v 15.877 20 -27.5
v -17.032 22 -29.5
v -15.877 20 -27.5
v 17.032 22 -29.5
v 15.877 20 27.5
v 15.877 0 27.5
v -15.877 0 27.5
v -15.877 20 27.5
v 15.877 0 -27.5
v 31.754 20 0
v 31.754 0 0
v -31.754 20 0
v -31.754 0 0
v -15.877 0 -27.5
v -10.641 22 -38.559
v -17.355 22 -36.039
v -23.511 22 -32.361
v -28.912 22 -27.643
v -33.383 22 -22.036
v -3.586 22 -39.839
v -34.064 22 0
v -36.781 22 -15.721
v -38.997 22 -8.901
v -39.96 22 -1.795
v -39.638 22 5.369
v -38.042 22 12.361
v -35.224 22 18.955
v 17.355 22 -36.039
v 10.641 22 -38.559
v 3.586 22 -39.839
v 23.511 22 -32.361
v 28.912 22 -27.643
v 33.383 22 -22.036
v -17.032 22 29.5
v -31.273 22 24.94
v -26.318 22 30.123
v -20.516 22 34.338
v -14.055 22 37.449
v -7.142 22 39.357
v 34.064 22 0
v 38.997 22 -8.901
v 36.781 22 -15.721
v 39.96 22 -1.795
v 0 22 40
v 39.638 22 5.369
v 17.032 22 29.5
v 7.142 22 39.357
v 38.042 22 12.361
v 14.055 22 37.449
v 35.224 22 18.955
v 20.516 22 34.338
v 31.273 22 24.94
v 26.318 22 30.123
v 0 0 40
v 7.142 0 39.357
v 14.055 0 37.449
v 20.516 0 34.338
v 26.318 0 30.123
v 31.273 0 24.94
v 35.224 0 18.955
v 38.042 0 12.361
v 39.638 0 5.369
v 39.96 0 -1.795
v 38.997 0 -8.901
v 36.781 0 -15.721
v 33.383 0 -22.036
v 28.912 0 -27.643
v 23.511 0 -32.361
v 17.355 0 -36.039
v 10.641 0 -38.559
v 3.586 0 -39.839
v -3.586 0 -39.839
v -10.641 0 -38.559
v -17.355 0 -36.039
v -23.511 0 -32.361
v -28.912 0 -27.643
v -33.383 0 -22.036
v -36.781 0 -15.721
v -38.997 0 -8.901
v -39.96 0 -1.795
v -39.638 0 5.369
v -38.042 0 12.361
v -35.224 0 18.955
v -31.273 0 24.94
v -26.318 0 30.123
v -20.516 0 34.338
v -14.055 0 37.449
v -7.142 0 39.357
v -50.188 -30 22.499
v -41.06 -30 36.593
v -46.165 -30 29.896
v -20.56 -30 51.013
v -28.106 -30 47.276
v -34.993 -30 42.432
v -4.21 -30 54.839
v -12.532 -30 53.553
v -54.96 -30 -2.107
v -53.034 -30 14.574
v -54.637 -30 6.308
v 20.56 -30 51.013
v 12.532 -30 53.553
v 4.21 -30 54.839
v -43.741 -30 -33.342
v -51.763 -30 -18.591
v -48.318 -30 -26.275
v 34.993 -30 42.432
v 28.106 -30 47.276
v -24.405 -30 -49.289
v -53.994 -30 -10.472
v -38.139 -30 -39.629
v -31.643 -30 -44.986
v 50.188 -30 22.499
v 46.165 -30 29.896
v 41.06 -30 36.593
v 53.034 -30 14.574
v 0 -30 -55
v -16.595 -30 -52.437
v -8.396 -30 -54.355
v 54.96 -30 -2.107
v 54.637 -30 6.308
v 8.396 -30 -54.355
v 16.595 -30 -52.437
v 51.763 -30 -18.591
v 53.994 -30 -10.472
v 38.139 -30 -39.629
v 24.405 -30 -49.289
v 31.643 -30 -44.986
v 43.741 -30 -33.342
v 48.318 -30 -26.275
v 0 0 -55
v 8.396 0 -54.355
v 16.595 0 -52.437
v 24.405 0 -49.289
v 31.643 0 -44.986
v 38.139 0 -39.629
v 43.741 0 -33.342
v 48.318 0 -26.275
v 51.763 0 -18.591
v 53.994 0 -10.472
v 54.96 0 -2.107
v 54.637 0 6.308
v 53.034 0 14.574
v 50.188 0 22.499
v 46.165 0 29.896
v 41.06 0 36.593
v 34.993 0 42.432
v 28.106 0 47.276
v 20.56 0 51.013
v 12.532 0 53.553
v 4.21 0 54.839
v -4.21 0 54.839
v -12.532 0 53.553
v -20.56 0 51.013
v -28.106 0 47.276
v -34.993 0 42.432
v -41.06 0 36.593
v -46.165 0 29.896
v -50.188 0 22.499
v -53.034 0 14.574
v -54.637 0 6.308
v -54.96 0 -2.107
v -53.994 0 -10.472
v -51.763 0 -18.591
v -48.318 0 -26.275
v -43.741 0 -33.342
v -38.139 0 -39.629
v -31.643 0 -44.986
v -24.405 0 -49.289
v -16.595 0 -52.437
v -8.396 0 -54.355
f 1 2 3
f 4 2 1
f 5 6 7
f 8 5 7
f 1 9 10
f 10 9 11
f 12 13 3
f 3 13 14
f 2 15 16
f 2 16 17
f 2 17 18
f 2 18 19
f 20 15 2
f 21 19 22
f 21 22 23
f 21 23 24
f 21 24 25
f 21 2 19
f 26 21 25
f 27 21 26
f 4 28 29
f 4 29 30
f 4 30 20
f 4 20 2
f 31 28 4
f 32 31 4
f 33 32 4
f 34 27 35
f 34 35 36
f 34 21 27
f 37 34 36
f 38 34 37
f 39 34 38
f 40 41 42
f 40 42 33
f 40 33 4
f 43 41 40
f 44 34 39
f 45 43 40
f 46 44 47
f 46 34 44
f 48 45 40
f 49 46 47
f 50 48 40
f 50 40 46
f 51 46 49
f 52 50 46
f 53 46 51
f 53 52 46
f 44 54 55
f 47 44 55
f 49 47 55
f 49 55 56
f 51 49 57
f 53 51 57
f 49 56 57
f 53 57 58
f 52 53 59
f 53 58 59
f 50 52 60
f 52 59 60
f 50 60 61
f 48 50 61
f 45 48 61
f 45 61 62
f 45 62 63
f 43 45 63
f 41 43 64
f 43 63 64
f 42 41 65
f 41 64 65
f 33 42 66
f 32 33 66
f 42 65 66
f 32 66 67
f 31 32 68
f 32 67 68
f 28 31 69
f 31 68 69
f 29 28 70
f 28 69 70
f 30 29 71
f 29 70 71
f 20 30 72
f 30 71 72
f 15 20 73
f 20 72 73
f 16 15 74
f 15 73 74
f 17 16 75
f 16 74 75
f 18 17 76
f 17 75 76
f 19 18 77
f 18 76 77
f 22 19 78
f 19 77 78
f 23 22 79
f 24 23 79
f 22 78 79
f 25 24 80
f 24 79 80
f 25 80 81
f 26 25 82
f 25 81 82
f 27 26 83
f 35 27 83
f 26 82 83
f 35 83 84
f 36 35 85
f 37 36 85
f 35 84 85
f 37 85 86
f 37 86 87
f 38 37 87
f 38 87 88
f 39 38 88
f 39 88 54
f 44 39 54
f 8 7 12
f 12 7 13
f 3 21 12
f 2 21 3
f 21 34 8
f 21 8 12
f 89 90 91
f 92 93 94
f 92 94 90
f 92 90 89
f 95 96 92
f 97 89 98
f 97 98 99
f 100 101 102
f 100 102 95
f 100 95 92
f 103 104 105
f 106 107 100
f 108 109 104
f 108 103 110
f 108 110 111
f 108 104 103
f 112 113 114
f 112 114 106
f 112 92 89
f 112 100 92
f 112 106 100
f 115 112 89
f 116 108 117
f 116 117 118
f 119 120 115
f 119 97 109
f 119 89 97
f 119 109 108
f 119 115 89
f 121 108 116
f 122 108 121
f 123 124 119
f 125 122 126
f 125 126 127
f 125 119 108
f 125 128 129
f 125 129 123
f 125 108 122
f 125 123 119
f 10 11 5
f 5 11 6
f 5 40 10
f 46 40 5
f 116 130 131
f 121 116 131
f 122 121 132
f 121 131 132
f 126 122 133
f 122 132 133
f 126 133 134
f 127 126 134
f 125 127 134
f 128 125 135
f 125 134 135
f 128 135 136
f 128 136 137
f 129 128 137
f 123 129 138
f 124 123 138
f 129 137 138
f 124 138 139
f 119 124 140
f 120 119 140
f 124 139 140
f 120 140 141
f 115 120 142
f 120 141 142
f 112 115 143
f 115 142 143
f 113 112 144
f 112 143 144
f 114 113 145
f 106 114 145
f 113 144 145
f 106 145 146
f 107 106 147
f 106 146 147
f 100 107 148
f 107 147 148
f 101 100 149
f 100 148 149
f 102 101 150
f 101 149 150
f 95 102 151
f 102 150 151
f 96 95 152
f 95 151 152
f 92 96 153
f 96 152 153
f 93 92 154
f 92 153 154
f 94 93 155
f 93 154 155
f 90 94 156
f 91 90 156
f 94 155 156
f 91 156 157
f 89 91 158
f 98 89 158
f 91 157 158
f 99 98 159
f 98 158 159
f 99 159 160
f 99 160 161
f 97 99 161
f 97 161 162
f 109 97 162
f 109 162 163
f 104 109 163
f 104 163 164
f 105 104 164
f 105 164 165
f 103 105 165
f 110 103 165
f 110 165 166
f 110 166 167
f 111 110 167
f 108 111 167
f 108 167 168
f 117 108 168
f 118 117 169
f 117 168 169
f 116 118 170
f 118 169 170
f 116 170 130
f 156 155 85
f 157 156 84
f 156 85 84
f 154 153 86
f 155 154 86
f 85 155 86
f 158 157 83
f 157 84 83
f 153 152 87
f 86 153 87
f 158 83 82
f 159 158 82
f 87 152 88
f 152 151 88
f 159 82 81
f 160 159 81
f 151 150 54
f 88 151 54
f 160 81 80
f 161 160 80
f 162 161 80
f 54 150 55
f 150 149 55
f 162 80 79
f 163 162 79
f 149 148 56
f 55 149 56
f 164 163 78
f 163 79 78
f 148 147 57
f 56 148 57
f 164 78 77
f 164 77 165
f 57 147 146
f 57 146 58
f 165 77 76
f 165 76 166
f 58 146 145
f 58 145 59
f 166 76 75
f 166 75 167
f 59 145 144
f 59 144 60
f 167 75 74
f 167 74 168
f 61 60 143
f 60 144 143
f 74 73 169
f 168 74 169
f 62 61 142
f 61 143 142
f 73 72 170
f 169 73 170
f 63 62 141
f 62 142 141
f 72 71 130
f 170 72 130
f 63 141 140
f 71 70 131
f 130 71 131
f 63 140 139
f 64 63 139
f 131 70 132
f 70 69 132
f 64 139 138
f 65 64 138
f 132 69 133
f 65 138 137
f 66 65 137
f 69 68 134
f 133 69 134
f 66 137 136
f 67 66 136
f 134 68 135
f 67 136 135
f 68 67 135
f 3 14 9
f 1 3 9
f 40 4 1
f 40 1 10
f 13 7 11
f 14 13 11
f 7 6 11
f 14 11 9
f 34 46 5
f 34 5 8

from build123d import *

# Parameters (mm, degrees)
SZKIC1_R                    = 40
DODANIE_WYCI_GNI_CIE1_DEPTH = 22
SFAZOWANIE1_SIZE            = 2
SZKIC2_R                    = 55
DODANIE_WYCI_GNI_CIE2_DEPTH = 30


with BuildPart() as part:
    # Szkic1 → Dodanie-wyciągnięcie1 (new body)
    with BuildSketch(Plane(origin=(0, 0, 0), x_dir=(1, 0, 0), z_dir=(0, 1, 0))):
        with Locations(Location((0, 0, 0), (0, 0, 270))):
            Circle(SZKIC1_R)
        Polygon((-15.877132403, 27.5), (15.877132403, 27.5), (31.754264805, 0), (15.877132403, -27.5), (-15.877132403, -27.5), (-31.754264805, 0), align=None, mode=Mode.SUBTRACT)
    extrude(amount=DODANIE_WYCI_GNI_CIE1_DEPTH)

    # Sfazowanie1
    sfazowanie1_edges = [part.edges().sort_by_distance(p)[0] for p in [
        (-23.815698604, 22, -13.75),
        (-23.815698604, 22, 13.75),
        (0, 22, 27.5),
        (23.815698604, 22, 13.75),
        (23.815698604, 22, -13.75),
        (0, 22, -27.5),
    ]]
    chamfer(sfazowanie1_edges, length=SFAZOWANIE1_SIZE)

    # Szkic2 → Dodanie-wyciągnięcie2 (add)
    with BuildSketch(Plane.XZ):
        with Locations(Location((0, 0, 0), (0, 0, 270))):
            Circle(SZKIC2_R)
    extrude(amount=DODANIE_WYCI_GNI_CIE2_DEPTH)


solid = part.part
